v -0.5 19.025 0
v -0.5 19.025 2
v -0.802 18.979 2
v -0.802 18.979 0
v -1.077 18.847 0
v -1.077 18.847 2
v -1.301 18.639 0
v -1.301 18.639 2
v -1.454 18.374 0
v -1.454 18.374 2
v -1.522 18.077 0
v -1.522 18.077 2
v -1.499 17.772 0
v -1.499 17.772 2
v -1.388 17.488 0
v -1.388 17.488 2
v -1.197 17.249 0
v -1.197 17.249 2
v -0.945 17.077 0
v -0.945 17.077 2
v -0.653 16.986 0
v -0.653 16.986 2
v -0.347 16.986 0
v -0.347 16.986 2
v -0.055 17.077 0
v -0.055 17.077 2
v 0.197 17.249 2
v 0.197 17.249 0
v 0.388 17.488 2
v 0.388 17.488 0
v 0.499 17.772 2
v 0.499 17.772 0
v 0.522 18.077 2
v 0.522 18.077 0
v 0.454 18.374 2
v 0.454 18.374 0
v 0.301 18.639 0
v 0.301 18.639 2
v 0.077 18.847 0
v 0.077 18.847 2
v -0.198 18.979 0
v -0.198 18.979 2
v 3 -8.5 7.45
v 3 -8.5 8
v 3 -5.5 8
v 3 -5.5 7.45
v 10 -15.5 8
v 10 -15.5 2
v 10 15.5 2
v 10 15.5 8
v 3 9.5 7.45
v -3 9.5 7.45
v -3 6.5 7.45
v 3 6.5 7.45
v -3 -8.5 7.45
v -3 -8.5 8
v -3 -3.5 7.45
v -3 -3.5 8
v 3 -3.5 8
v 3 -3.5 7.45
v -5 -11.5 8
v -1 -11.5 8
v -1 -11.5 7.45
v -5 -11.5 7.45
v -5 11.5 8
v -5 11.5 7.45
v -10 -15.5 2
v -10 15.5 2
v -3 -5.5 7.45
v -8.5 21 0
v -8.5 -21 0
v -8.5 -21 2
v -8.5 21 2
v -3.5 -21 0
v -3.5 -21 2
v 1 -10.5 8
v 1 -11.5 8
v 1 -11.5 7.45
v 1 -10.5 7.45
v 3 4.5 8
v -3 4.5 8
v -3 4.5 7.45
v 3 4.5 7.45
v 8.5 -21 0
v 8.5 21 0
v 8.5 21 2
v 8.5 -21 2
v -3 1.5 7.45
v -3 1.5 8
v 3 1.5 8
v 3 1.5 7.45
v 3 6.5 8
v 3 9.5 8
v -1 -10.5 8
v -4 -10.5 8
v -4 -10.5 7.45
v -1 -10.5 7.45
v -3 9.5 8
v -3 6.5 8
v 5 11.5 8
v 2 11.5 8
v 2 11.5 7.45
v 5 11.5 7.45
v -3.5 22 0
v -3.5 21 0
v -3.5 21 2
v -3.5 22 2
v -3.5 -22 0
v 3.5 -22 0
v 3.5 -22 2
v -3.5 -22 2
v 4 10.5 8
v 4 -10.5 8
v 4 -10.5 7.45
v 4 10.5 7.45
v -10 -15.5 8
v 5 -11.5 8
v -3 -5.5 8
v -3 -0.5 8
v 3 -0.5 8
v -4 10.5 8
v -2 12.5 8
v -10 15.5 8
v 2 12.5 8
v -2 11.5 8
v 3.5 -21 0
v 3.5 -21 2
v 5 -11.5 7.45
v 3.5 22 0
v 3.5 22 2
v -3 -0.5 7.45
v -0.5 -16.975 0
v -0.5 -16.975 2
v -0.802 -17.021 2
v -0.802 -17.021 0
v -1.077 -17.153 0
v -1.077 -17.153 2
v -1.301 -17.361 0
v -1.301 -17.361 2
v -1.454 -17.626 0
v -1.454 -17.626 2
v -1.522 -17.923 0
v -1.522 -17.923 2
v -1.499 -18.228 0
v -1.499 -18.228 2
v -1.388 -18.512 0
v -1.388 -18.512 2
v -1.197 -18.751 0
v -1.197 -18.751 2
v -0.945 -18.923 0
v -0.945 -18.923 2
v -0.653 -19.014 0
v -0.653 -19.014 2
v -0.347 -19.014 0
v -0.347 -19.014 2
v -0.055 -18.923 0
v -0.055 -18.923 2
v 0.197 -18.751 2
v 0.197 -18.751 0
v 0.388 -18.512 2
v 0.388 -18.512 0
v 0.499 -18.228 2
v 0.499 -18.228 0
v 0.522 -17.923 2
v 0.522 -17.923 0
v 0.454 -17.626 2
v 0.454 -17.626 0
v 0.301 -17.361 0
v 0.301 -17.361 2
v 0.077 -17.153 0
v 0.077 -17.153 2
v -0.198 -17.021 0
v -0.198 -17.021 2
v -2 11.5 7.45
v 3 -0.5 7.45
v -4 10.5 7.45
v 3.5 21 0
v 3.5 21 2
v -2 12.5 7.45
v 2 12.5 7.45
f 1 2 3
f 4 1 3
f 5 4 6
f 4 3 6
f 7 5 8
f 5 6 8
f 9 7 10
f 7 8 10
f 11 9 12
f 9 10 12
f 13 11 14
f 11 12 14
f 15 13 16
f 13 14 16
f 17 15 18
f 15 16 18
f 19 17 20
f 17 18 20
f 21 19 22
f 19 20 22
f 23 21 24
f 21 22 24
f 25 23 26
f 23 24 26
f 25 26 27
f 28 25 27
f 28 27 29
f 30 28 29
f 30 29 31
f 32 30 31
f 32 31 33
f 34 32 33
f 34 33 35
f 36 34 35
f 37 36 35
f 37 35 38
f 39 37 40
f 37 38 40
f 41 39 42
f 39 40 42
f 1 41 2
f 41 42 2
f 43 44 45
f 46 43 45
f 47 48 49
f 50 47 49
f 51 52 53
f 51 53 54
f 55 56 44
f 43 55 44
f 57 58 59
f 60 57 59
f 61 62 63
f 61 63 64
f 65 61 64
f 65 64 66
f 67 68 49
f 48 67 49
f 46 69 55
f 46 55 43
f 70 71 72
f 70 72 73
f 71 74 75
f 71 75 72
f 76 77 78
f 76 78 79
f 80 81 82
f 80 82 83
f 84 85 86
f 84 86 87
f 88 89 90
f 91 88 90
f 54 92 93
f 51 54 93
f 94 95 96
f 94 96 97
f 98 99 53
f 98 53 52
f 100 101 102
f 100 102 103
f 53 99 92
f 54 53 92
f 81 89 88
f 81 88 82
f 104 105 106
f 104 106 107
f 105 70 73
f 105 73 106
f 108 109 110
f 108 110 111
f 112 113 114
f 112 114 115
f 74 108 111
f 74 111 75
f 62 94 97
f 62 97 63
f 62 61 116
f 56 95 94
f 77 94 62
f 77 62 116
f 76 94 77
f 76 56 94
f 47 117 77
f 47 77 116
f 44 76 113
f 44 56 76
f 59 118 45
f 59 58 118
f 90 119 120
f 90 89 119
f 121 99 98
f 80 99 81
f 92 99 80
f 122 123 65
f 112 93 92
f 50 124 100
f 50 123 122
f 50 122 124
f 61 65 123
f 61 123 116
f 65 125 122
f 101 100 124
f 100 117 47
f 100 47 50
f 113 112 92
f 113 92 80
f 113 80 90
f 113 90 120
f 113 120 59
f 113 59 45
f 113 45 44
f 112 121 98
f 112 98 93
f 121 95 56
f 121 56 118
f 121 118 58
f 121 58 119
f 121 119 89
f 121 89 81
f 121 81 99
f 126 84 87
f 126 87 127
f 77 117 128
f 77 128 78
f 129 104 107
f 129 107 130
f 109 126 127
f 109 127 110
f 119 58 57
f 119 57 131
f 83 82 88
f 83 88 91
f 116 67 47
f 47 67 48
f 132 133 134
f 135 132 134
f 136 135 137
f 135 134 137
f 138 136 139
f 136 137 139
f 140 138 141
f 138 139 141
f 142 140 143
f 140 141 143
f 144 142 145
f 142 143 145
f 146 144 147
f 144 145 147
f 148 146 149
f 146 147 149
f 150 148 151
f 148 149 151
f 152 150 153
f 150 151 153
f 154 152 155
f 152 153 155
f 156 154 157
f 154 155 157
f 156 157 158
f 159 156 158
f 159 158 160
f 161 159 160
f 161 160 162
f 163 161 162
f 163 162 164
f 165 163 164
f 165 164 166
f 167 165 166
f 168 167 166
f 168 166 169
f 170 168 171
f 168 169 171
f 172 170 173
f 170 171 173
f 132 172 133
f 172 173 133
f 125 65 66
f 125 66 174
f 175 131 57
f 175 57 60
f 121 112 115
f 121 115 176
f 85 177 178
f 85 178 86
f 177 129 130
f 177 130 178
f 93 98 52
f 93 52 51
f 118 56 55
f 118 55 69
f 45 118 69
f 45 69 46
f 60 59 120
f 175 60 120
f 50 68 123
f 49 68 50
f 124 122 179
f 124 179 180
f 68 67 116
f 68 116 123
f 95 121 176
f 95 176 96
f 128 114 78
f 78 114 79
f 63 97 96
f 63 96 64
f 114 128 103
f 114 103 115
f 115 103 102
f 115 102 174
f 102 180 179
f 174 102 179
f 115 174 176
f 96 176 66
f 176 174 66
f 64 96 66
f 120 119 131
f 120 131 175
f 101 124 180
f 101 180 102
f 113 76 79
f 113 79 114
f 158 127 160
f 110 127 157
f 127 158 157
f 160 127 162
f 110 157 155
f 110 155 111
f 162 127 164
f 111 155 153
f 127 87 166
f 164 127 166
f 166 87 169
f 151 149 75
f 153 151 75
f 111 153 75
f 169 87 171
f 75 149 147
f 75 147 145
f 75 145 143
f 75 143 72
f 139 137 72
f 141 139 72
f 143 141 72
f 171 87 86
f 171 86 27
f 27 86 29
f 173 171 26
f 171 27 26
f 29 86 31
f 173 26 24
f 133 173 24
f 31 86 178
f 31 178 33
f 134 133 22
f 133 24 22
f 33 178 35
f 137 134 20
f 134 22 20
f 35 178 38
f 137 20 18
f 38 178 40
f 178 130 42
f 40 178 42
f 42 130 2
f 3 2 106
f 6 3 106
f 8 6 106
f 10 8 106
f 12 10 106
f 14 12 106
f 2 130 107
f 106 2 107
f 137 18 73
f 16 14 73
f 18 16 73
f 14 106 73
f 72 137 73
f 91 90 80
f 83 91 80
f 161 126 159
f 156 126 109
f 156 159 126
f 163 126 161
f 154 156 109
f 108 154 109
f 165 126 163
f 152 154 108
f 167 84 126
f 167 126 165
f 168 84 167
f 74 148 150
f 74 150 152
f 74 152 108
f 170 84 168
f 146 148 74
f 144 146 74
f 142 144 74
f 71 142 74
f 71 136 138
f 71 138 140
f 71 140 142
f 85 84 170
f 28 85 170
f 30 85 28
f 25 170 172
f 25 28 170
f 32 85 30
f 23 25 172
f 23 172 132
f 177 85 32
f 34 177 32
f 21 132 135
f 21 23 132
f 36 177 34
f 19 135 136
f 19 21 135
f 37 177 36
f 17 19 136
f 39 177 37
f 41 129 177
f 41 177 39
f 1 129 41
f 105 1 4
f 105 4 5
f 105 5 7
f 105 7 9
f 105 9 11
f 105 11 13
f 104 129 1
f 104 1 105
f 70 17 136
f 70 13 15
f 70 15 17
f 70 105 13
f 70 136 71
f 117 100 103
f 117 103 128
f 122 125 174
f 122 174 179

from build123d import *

# Parameters (mm, degrees)
BOSS_EXTRUDE1_DEPTH                     = 2
SKETCH2_W                               = 20
SKETCH2_H                               = 31
BOSS_EXTRUDE2_DEPTH                     = 6
SKETCH3_W                               = 6
SKETCH3_H                               = 3
CUT_EXTRUDE1_DEPTH                      = 0.55
SKETCH6_W                               = 1.025
SKETCH6_H                               = 8
TAP_DRILL_FOR_M2_5X0_45_TAP1_AT_2_COUNT = 2
TAP_DRILL_FOR_M2_5X0_45_TAP1_AT_2_PITCH = 36


with BuildPart() as part:
    # Sketch1 → Boss-Extrude1 (new body)
    with BuildSketch(Plane.XY):
        Polygon((-3.5, 22), (3.5, 22), (3.5, 21), (8.5, 21), (8.5, -21), (3.5, -21), (3.5, -22), (-3.5, -22), (-3.5, -21), (-8.5, -21), (-8.5, 21), (-3.5, 21), align=None)
    extrude(amount=BOSS_EXTRUDE1_DEPTH)

    # Sketch6 → Tap Drill for M2.5x0.45 Tap1 (revolve, cut)
    with BuildSketch(Plane(origin=(-0.5, 18, 0), x_dir=(0, 1, 0), z_dir=(1, 0, 0))):
        with Locations((0.5125, 4)):
            Rectangle(SKETCH6_W, SKETCH6_H)
    tap_drill_for_m2_5x0_45_tap1 = revolve(axis=Axis((-0.5, 18, -6.35), (0, 0, 1)), mode=Mode.SUBTRACT)

    # Tap Drill for M2.5x0.45 Tap1 at 2: Tap Drill for M2.5x0.45 Tap1 ×2
    with Locations(*[(0, -i * TAP_DRILL_FOR_M2_5X0_45_TAP1_AT_2_PITCH, 0) for i in range(1, TAP_DRILL_FOR_M2_5X0_45_TAP1_AT_2_COUNT)]):
        add(tap_drill_for_m2_5x0_45_tap1, mode=Mode.SUBTRACT)


with BuildPart() as body_2:
    # Sketch2 → Boss-Extrude2 (new body)
    with BuildSketch(Plane.XY.offset(2)):
        Rectangle(SKETCH2_W, SKETCH2_H)
    extrude(amount=BOSS_EXTRUDE2_DEPTH)

    # Sketch3 → Cut-Extrude1 (cut)
    with BuildSketch(Plane.XY.offset(8)):
        Polygon((-1, -11.5), (-5, -11.5), (-5, 11.5), (-2, 11.5), (-2, 12.5), (2, 12.5), (2, 11.5), (5, 11.5), (5, -11.5), (1, -11.5), (1, -10.5), (4, -10.5), (4, 10.5), (-4, 10.5), (-4, -10.5), (-1, -10.5), align=None)
        with Locations((0, -2)):
            Rectangle(SKETCH3_W, SKETCH3_H)
        with Locations((0, -7)):
            Rectangle(SKETCH3_W, SKETCH3_H)
        with Locations((0, 3)):
            Rectangle(SKETCH3_W, SKETCH3_H)
        with Locations((0, 8)):
            Rectangle(SKETCH3_W, SKETCH3_H)
    extrude(amount=-CUT_EXTRUDE1_DEPTH, mode=Mode.SUBTRACT)


solid = Compound([part.part, body_2.part])
